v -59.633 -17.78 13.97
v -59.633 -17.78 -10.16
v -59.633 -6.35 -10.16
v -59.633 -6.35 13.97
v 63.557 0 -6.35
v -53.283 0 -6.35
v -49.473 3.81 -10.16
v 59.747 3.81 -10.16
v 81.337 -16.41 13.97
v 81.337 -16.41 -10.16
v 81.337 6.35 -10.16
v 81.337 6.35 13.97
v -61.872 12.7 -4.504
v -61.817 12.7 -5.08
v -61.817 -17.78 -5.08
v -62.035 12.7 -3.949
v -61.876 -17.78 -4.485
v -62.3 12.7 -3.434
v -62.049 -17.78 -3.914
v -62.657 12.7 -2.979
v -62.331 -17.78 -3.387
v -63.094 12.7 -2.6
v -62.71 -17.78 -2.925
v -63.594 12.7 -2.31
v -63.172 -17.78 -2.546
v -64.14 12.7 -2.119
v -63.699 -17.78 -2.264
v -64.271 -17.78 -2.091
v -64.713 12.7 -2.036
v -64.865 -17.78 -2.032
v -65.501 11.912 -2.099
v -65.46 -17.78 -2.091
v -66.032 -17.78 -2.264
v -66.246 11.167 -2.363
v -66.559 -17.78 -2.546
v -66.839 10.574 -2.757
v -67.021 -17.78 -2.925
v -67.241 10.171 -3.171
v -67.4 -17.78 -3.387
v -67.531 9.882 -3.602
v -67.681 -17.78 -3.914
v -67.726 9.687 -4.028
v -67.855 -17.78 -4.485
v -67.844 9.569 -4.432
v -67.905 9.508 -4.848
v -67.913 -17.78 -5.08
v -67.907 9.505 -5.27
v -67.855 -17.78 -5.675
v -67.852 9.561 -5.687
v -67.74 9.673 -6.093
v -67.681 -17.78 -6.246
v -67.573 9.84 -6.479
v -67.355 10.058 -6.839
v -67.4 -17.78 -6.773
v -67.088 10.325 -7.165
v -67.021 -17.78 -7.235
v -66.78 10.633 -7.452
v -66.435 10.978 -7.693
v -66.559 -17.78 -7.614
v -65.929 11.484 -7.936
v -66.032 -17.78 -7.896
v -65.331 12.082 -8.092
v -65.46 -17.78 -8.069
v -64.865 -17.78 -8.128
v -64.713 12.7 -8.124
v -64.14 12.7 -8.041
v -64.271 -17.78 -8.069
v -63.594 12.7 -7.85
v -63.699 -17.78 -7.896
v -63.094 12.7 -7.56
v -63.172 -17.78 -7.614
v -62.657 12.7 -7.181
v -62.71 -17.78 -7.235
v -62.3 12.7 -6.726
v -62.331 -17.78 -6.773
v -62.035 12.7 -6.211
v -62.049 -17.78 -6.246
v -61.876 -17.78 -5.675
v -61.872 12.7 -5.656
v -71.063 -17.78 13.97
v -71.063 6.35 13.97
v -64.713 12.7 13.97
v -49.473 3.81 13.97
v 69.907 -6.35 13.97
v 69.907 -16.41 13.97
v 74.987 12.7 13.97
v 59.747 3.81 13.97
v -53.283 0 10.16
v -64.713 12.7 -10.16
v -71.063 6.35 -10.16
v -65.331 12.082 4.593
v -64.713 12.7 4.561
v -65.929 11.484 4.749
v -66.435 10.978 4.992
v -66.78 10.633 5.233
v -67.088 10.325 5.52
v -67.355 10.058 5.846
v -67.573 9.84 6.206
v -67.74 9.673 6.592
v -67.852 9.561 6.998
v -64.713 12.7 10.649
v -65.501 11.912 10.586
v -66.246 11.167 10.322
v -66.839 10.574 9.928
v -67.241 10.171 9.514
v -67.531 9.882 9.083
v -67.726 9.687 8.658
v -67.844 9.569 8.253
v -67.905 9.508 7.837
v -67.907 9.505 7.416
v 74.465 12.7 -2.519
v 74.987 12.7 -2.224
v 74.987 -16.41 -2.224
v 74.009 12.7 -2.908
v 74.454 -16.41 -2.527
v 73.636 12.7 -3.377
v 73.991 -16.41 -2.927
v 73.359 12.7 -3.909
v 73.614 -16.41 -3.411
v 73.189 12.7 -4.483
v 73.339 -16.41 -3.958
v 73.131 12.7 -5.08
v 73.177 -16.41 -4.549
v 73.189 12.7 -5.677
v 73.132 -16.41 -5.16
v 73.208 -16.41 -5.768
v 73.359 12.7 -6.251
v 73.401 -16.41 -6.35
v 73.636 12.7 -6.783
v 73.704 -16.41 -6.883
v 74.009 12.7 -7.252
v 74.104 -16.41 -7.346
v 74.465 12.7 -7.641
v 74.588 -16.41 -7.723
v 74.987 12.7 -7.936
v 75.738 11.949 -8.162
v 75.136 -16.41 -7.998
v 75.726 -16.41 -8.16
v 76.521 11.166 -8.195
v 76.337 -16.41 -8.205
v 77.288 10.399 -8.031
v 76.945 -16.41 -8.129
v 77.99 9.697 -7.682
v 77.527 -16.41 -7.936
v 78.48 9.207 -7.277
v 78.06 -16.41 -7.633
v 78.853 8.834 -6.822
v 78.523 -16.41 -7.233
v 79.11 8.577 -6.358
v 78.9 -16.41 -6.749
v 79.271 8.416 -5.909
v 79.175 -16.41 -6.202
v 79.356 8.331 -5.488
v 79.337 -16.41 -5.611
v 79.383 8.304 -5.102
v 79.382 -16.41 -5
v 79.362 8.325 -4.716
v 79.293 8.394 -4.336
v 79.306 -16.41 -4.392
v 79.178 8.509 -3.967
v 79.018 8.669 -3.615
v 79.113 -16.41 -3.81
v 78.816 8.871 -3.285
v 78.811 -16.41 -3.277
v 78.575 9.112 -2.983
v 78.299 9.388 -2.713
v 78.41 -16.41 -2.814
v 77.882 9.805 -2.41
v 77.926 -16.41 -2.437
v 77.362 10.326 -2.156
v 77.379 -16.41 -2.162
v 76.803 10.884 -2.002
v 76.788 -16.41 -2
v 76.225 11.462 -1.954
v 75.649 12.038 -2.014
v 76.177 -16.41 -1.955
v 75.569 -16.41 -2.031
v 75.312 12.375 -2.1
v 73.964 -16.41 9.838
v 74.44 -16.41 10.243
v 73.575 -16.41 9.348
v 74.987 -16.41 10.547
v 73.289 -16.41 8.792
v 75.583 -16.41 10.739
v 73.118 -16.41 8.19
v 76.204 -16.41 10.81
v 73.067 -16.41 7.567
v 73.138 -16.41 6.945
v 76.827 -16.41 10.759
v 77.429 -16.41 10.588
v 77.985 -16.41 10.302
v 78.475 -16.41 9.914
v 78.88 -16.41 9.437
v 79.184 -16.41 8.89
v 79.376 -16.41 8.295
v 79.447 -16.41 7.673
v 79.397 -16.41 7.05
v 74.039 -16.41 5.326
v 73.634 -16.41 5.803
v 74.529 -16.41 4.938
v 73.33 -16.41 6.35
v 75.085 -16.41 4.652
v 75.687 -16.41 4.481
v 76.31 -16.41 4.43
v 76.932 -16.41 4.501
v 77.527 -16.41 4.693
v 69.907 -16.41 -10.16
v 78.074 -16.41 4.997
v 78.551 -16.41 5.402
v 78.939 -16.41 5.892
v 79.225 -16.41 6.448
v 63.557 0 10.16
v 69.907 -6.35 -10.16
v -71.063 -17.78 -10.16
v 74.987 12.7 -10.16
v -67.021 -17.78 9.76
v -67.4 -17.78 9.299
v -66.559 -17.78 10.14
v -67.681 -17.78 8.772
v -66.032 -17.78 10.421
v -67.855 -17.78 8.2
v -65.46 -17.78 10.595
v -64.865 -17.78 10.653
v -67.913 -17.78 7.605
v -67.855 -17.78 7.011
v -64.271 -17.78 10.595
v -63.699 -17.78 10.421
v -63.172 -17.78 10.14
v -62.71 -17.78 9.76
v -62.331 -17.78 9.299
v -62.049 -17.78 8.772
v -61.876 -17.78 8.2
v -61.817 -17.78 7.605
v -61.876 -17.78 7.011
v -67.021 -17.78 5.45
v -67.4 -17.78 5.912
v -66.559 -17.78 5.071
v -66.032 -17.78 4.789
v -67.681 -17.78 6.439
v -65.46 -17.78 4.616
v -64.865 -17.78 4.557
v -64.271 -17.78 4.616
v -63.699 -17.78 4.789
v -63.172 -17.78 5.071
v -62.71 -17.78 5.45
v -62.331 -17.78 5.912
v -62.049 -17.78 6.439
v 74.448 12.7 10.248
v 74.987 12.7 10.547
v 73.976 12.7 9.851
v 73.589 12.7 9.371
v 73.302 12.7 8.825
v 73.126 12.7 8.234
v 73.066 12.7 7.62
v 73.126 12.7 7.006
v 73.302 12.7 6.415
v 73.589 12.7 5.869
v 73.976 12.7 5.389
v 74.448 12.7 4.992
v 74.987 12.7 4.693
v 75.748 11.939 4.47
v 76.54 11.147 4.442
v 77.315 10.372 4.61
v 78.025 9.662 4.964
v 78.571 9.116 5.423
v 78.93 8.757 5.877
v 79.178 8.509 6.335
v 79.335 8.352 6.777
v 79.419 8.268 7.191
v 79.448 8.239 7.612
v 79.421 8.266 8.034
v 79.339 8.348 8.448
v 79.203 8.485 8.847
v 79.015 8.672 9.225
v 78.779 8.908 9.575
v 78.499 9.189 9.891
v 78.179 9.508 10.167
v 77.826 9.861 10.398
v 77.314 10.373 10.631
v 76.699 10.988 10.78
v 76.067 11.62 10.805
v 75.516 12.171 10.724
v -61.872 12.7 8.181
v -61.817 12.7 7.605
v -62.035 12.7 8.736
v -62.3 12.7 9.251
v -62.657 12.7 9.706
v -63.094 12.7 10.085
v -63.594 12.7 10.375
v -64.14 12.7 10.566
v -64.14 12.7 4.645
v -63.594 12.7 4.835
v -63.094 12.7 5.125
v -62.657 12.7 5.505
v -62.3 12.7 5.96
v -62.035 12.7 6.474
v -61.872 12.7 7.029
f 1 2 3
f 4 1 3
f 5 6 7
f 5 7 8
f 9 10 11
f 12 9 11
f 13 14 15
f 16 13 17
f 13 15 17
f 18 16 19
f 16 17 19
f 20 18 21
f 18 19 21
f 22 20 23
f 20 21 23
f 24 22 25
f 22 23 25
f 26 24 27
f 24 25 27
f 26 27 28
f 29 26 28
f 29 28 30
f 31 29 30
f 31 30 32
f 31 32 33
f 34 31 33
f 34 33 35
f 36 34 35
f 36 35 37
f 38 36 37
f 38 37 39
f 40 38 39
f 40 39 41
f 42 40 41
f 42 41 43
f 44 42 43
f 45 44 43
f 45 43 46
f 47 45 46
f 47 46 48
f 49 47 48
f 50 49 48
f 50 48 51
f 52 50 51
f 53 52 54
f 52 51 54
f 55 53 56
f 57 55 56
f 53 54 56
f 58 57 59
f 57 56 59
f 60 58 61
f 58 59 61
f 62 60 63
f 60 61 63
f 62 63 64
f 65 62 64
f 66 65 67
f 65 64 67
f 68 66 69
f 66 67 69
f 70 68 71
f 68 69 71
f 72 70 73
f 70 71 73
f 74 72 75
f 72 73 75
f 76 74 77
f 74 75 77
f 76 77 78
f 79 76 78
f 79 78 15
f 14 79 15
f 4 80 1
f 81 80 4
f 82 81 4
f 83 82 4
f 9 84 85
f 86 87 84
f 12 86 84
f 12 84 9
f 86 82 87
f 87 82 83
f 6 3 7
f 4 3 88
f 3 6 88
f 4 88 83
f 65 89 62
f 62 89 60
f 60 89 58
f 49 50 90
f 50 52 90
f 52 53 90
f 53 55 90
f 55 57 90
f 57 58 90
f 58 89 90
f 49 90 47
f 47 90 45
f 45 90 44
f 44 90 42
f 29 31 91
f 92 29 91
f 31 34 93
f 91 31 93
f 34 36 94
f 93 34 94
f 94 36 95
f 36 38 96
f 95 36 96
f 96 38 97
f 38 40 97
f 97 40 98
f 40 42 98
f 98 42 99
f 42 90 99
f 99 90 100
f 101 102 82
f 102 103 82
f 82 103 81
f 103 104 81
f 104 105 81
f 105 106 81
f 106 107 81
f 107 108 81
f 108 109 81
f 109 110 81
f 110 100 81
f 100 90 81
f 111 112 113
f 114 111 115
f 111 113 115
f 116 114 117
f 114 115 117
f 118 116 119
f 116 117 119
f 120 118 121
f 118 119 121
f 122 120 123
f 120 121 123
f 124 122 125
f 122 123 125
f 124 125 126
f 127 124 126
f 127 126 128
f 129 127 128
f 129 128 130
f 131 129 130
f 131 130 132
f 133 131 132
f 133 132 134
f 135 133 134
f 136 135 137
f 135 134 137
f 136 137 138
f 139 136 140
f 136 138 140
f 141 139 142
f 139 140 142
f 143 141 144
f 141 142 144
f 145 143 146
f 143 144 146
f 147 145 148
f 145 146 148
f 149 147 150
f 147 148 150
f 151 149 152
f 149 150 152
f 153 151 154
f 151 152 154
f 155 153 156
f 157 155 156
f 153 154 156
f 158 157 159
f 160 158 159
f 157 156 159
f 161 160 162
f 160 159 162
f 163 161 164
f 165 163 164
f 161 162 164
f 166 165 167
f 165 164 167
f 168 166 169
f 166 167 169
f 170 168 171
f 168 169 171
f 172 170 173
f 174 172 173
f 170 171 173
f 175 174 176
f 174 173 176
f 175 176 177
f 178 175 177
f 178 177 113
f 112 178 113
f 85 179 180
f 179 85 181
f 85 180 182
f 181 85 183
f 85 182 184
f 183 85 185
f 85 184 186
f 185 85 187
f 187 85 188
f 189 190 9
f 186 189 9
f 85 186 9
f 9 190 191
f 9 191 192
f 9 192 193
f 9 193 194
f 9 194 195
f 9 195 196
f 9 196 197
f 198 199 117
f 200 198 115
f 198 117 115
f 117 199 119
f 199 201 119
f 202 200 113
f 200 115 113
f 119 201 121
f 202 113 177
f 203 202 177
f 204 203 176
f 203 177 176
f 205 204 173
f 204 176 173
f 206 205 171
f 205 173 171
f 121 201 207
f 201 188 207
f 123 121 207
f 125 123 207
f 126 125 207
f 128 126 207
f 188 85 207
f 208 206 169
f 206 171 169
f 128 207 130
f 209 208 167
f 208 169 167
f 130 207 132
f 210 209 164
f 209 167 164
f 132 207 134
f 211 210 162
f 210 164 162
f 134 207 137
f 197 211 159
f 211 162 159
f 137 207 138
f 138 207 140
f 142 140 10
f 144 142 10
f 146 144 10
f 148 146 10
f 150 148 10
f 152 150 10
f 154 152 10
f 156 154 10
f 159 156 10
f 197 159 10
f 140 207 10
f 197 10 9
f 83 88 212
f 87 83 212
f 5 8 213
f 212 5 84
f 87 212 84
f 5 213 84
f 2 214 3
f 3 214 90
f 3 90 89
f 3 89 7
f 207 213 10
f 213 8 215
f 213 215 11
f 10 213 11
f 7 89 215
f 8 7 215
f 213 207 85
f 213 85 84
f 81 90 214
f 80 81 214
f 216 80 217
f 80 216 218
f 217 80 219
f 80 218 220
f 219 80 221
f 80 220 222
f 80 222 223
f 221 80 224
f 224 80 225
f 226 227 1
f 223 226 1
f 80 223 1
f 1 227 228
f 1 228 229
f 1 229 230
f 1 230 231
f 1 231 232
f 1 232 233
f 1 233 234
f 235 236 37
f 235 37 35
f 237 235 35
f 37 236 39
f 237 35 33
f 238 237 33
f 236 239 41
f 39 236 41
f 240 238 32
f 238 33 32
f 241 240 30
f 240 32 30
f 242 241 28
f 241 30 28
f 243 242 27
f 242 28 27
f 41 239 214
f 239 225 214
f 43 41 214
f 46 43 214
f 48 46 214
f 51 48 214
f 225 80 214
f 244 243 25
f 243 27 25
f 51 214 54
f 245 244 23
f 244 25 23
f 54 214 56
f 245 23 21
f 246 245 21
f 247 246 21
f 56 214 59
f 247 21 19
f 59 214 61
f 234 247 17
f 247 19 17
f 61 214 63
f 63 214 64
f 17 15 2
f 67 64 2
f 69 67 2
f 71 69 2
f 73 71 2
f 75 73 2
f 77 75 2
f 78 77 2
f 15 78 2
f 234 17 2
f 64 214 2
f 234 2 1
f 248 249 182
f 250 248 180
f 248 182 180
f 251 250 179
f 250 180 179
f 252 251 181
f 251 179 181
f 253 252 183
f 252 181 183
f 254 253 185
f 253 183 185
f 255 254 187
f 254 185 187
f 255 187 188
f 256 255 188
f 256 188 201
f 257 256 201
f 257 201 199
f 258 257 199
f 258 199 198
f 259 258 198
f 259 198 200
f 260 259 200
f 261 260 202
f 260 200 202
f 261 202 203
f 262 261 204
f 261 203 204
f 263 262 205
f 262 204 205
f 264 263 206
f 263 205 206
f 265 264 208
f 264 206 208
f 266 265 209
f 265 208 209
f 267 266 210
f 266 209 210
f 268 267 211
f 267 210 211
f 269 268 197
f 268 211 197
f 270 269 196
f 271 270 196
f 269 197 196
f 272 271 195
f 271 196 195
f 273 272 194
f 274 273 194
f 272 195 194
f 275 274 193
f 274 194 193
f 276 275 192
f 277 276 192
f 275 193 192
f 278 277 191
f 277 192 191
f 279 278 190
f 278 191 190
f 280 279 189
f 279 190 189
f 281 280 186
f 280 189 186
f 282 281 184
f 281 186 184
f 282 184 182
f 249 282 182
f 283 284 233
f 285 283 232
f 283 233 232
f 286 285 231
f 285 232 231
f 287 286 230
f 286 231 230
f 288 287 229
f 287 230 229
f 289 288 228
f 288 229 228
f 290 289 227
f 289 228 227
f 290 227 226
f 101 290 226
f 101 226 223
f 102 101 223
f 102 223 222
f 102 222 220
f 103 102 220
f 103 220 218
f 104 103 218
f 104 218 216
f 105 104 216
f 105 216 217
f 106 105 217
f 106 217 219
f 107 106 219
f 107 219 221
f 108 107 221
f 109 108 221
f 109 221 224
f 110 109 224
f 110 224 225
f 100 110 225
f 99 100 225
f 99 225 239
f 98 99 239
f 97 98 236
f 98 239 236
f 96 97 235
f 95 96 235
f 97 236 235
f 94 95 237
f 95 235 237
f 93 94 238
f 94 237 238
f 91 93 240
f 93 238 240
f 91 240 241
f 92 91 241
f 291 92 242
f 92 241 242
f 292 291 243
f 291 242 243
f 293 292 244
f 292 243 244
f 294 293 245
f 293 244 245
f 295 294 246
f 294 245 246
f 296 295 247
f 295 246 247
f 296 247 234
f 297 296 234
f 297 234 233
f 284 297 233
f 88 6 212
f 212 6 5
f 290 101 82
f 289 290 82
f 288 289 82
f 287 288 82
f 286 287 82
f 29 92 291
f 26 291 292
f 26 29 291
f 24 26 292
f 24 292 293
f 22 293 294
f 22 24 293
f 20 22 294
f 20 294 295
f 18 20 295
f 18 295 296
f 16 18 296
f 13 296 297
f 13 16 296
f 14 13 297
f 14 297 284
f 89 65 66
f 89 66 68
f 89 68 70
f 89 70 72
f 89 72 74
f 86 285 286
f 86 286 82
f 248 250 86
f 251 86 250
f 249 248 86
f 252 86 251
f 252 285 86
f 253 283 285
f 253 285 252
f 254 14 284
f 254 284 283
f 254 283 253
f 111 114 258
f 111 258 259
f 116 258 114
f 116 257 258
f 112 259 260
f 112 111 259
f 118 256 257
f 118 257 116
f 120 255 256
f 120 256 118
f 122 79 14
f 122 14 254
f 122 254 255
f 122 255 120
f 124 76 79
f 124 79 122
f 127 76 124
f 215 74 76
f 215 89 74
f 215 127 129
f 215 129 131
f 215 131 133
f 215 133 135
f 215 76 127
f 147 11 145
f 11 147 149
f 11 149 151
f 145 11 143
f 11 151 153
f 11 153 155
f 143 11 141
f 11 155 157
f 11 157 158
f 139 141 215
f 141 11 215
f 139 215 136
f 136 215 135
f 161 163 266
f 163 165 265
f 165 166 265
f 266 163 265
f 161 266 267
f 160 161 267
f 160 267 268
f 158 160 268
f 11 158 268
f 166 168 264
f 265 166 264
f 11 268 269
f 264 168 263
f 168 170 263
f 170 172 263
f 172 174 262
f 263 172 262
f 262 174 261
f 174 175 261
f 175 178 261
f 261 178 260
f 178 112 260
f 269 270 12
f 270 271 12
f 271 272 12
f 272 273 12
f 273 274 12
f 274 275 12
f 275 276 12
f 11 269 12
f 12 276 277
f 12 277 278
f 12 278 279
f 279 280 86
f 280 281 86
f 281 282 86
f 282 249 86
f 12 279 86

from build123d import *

# Parameters (mm, degrees)
BOSS_EXTRUDE1_DEPTH      = 13.97
BOSS_EXTRUDE1_DEPTH_BACK = 10.16
CHAMFER1_SIZE            = 6.35
SKETCH2_R                = 3.048
SKETCH2_R_2              = 3.190843713
SKETCH2_R_3              = 3.125749827
CUT_EXTRUDE1_DEPTH       = 88.976767749
CHAMFER2_SIZE            = 3.81


with BuildPart() as part:
    # Sketch1 → Boss-Extrude1 (new, two sides: drawn at the far end of the back side and taken through both)
    with BuildSketch(Plane.XY.offset(-BOSS_EXTRUDE1_DEPTH_BACK)):
        Polygon((81.337078652, 12.7), (-71.062921348, 12.7), (-71.062921348, -17.78), (-59.632921348, -17.78), (-59.632921348, 0), (69.907078652, 0), (69.907078652, -16.41011236), (81.337078652, -16.41011236), align=None)
    extrude(amount=BOSS_EXTRUDE1_DEPTH + BOSS_EXTRUDE1_DEPTH_BACK)

    # Chamfer1
    chamfer1_edges = [part.edges().sort_by_distance(p)[0] for p in [
        (69.907078652, 0, 1.905),
        (-59.632921348, 0, 1.905),
        (-71.062921348, 12.7, 1.905),
        (81.337078652, 12.7, 1.905),
    ]]
    chamfer(chamfer1_edges, length=CHAMFER1_SIZE)

    # Sketch2 → Cut-Extrude1 (cut, through all)
    with BuildSketch(Plane.XZ.offset(17.78)):
        with Locations((-64.865321348, 7.605218814)):
            Circle(SKETCH2_R)
        with Locations((-64.865321348, -5.08)):
            Circle(SKETCH2_R)
        with Locations((76.257078652, 7.62)):
            Circle(SKETCH2_R_2)
        with Locations((76.257078652, -5.08)):
            Circle(SKETCH2_R_3)
    extrude(amount=-CUT_EXTRUDE1_DEPTH, mode=Mode.SUBTRACT)

    # Chamfer2
    chamfer2_edges = [part.edges().sort_by_distance(p)[0] for p in [
        (5.137078652, 0, -10.16),
        (5.137078652, 0, 13.97),
    ]]
    chamfer(chamfer2_edges, length=CHAMFER2_SIZE)


solid = part.part
